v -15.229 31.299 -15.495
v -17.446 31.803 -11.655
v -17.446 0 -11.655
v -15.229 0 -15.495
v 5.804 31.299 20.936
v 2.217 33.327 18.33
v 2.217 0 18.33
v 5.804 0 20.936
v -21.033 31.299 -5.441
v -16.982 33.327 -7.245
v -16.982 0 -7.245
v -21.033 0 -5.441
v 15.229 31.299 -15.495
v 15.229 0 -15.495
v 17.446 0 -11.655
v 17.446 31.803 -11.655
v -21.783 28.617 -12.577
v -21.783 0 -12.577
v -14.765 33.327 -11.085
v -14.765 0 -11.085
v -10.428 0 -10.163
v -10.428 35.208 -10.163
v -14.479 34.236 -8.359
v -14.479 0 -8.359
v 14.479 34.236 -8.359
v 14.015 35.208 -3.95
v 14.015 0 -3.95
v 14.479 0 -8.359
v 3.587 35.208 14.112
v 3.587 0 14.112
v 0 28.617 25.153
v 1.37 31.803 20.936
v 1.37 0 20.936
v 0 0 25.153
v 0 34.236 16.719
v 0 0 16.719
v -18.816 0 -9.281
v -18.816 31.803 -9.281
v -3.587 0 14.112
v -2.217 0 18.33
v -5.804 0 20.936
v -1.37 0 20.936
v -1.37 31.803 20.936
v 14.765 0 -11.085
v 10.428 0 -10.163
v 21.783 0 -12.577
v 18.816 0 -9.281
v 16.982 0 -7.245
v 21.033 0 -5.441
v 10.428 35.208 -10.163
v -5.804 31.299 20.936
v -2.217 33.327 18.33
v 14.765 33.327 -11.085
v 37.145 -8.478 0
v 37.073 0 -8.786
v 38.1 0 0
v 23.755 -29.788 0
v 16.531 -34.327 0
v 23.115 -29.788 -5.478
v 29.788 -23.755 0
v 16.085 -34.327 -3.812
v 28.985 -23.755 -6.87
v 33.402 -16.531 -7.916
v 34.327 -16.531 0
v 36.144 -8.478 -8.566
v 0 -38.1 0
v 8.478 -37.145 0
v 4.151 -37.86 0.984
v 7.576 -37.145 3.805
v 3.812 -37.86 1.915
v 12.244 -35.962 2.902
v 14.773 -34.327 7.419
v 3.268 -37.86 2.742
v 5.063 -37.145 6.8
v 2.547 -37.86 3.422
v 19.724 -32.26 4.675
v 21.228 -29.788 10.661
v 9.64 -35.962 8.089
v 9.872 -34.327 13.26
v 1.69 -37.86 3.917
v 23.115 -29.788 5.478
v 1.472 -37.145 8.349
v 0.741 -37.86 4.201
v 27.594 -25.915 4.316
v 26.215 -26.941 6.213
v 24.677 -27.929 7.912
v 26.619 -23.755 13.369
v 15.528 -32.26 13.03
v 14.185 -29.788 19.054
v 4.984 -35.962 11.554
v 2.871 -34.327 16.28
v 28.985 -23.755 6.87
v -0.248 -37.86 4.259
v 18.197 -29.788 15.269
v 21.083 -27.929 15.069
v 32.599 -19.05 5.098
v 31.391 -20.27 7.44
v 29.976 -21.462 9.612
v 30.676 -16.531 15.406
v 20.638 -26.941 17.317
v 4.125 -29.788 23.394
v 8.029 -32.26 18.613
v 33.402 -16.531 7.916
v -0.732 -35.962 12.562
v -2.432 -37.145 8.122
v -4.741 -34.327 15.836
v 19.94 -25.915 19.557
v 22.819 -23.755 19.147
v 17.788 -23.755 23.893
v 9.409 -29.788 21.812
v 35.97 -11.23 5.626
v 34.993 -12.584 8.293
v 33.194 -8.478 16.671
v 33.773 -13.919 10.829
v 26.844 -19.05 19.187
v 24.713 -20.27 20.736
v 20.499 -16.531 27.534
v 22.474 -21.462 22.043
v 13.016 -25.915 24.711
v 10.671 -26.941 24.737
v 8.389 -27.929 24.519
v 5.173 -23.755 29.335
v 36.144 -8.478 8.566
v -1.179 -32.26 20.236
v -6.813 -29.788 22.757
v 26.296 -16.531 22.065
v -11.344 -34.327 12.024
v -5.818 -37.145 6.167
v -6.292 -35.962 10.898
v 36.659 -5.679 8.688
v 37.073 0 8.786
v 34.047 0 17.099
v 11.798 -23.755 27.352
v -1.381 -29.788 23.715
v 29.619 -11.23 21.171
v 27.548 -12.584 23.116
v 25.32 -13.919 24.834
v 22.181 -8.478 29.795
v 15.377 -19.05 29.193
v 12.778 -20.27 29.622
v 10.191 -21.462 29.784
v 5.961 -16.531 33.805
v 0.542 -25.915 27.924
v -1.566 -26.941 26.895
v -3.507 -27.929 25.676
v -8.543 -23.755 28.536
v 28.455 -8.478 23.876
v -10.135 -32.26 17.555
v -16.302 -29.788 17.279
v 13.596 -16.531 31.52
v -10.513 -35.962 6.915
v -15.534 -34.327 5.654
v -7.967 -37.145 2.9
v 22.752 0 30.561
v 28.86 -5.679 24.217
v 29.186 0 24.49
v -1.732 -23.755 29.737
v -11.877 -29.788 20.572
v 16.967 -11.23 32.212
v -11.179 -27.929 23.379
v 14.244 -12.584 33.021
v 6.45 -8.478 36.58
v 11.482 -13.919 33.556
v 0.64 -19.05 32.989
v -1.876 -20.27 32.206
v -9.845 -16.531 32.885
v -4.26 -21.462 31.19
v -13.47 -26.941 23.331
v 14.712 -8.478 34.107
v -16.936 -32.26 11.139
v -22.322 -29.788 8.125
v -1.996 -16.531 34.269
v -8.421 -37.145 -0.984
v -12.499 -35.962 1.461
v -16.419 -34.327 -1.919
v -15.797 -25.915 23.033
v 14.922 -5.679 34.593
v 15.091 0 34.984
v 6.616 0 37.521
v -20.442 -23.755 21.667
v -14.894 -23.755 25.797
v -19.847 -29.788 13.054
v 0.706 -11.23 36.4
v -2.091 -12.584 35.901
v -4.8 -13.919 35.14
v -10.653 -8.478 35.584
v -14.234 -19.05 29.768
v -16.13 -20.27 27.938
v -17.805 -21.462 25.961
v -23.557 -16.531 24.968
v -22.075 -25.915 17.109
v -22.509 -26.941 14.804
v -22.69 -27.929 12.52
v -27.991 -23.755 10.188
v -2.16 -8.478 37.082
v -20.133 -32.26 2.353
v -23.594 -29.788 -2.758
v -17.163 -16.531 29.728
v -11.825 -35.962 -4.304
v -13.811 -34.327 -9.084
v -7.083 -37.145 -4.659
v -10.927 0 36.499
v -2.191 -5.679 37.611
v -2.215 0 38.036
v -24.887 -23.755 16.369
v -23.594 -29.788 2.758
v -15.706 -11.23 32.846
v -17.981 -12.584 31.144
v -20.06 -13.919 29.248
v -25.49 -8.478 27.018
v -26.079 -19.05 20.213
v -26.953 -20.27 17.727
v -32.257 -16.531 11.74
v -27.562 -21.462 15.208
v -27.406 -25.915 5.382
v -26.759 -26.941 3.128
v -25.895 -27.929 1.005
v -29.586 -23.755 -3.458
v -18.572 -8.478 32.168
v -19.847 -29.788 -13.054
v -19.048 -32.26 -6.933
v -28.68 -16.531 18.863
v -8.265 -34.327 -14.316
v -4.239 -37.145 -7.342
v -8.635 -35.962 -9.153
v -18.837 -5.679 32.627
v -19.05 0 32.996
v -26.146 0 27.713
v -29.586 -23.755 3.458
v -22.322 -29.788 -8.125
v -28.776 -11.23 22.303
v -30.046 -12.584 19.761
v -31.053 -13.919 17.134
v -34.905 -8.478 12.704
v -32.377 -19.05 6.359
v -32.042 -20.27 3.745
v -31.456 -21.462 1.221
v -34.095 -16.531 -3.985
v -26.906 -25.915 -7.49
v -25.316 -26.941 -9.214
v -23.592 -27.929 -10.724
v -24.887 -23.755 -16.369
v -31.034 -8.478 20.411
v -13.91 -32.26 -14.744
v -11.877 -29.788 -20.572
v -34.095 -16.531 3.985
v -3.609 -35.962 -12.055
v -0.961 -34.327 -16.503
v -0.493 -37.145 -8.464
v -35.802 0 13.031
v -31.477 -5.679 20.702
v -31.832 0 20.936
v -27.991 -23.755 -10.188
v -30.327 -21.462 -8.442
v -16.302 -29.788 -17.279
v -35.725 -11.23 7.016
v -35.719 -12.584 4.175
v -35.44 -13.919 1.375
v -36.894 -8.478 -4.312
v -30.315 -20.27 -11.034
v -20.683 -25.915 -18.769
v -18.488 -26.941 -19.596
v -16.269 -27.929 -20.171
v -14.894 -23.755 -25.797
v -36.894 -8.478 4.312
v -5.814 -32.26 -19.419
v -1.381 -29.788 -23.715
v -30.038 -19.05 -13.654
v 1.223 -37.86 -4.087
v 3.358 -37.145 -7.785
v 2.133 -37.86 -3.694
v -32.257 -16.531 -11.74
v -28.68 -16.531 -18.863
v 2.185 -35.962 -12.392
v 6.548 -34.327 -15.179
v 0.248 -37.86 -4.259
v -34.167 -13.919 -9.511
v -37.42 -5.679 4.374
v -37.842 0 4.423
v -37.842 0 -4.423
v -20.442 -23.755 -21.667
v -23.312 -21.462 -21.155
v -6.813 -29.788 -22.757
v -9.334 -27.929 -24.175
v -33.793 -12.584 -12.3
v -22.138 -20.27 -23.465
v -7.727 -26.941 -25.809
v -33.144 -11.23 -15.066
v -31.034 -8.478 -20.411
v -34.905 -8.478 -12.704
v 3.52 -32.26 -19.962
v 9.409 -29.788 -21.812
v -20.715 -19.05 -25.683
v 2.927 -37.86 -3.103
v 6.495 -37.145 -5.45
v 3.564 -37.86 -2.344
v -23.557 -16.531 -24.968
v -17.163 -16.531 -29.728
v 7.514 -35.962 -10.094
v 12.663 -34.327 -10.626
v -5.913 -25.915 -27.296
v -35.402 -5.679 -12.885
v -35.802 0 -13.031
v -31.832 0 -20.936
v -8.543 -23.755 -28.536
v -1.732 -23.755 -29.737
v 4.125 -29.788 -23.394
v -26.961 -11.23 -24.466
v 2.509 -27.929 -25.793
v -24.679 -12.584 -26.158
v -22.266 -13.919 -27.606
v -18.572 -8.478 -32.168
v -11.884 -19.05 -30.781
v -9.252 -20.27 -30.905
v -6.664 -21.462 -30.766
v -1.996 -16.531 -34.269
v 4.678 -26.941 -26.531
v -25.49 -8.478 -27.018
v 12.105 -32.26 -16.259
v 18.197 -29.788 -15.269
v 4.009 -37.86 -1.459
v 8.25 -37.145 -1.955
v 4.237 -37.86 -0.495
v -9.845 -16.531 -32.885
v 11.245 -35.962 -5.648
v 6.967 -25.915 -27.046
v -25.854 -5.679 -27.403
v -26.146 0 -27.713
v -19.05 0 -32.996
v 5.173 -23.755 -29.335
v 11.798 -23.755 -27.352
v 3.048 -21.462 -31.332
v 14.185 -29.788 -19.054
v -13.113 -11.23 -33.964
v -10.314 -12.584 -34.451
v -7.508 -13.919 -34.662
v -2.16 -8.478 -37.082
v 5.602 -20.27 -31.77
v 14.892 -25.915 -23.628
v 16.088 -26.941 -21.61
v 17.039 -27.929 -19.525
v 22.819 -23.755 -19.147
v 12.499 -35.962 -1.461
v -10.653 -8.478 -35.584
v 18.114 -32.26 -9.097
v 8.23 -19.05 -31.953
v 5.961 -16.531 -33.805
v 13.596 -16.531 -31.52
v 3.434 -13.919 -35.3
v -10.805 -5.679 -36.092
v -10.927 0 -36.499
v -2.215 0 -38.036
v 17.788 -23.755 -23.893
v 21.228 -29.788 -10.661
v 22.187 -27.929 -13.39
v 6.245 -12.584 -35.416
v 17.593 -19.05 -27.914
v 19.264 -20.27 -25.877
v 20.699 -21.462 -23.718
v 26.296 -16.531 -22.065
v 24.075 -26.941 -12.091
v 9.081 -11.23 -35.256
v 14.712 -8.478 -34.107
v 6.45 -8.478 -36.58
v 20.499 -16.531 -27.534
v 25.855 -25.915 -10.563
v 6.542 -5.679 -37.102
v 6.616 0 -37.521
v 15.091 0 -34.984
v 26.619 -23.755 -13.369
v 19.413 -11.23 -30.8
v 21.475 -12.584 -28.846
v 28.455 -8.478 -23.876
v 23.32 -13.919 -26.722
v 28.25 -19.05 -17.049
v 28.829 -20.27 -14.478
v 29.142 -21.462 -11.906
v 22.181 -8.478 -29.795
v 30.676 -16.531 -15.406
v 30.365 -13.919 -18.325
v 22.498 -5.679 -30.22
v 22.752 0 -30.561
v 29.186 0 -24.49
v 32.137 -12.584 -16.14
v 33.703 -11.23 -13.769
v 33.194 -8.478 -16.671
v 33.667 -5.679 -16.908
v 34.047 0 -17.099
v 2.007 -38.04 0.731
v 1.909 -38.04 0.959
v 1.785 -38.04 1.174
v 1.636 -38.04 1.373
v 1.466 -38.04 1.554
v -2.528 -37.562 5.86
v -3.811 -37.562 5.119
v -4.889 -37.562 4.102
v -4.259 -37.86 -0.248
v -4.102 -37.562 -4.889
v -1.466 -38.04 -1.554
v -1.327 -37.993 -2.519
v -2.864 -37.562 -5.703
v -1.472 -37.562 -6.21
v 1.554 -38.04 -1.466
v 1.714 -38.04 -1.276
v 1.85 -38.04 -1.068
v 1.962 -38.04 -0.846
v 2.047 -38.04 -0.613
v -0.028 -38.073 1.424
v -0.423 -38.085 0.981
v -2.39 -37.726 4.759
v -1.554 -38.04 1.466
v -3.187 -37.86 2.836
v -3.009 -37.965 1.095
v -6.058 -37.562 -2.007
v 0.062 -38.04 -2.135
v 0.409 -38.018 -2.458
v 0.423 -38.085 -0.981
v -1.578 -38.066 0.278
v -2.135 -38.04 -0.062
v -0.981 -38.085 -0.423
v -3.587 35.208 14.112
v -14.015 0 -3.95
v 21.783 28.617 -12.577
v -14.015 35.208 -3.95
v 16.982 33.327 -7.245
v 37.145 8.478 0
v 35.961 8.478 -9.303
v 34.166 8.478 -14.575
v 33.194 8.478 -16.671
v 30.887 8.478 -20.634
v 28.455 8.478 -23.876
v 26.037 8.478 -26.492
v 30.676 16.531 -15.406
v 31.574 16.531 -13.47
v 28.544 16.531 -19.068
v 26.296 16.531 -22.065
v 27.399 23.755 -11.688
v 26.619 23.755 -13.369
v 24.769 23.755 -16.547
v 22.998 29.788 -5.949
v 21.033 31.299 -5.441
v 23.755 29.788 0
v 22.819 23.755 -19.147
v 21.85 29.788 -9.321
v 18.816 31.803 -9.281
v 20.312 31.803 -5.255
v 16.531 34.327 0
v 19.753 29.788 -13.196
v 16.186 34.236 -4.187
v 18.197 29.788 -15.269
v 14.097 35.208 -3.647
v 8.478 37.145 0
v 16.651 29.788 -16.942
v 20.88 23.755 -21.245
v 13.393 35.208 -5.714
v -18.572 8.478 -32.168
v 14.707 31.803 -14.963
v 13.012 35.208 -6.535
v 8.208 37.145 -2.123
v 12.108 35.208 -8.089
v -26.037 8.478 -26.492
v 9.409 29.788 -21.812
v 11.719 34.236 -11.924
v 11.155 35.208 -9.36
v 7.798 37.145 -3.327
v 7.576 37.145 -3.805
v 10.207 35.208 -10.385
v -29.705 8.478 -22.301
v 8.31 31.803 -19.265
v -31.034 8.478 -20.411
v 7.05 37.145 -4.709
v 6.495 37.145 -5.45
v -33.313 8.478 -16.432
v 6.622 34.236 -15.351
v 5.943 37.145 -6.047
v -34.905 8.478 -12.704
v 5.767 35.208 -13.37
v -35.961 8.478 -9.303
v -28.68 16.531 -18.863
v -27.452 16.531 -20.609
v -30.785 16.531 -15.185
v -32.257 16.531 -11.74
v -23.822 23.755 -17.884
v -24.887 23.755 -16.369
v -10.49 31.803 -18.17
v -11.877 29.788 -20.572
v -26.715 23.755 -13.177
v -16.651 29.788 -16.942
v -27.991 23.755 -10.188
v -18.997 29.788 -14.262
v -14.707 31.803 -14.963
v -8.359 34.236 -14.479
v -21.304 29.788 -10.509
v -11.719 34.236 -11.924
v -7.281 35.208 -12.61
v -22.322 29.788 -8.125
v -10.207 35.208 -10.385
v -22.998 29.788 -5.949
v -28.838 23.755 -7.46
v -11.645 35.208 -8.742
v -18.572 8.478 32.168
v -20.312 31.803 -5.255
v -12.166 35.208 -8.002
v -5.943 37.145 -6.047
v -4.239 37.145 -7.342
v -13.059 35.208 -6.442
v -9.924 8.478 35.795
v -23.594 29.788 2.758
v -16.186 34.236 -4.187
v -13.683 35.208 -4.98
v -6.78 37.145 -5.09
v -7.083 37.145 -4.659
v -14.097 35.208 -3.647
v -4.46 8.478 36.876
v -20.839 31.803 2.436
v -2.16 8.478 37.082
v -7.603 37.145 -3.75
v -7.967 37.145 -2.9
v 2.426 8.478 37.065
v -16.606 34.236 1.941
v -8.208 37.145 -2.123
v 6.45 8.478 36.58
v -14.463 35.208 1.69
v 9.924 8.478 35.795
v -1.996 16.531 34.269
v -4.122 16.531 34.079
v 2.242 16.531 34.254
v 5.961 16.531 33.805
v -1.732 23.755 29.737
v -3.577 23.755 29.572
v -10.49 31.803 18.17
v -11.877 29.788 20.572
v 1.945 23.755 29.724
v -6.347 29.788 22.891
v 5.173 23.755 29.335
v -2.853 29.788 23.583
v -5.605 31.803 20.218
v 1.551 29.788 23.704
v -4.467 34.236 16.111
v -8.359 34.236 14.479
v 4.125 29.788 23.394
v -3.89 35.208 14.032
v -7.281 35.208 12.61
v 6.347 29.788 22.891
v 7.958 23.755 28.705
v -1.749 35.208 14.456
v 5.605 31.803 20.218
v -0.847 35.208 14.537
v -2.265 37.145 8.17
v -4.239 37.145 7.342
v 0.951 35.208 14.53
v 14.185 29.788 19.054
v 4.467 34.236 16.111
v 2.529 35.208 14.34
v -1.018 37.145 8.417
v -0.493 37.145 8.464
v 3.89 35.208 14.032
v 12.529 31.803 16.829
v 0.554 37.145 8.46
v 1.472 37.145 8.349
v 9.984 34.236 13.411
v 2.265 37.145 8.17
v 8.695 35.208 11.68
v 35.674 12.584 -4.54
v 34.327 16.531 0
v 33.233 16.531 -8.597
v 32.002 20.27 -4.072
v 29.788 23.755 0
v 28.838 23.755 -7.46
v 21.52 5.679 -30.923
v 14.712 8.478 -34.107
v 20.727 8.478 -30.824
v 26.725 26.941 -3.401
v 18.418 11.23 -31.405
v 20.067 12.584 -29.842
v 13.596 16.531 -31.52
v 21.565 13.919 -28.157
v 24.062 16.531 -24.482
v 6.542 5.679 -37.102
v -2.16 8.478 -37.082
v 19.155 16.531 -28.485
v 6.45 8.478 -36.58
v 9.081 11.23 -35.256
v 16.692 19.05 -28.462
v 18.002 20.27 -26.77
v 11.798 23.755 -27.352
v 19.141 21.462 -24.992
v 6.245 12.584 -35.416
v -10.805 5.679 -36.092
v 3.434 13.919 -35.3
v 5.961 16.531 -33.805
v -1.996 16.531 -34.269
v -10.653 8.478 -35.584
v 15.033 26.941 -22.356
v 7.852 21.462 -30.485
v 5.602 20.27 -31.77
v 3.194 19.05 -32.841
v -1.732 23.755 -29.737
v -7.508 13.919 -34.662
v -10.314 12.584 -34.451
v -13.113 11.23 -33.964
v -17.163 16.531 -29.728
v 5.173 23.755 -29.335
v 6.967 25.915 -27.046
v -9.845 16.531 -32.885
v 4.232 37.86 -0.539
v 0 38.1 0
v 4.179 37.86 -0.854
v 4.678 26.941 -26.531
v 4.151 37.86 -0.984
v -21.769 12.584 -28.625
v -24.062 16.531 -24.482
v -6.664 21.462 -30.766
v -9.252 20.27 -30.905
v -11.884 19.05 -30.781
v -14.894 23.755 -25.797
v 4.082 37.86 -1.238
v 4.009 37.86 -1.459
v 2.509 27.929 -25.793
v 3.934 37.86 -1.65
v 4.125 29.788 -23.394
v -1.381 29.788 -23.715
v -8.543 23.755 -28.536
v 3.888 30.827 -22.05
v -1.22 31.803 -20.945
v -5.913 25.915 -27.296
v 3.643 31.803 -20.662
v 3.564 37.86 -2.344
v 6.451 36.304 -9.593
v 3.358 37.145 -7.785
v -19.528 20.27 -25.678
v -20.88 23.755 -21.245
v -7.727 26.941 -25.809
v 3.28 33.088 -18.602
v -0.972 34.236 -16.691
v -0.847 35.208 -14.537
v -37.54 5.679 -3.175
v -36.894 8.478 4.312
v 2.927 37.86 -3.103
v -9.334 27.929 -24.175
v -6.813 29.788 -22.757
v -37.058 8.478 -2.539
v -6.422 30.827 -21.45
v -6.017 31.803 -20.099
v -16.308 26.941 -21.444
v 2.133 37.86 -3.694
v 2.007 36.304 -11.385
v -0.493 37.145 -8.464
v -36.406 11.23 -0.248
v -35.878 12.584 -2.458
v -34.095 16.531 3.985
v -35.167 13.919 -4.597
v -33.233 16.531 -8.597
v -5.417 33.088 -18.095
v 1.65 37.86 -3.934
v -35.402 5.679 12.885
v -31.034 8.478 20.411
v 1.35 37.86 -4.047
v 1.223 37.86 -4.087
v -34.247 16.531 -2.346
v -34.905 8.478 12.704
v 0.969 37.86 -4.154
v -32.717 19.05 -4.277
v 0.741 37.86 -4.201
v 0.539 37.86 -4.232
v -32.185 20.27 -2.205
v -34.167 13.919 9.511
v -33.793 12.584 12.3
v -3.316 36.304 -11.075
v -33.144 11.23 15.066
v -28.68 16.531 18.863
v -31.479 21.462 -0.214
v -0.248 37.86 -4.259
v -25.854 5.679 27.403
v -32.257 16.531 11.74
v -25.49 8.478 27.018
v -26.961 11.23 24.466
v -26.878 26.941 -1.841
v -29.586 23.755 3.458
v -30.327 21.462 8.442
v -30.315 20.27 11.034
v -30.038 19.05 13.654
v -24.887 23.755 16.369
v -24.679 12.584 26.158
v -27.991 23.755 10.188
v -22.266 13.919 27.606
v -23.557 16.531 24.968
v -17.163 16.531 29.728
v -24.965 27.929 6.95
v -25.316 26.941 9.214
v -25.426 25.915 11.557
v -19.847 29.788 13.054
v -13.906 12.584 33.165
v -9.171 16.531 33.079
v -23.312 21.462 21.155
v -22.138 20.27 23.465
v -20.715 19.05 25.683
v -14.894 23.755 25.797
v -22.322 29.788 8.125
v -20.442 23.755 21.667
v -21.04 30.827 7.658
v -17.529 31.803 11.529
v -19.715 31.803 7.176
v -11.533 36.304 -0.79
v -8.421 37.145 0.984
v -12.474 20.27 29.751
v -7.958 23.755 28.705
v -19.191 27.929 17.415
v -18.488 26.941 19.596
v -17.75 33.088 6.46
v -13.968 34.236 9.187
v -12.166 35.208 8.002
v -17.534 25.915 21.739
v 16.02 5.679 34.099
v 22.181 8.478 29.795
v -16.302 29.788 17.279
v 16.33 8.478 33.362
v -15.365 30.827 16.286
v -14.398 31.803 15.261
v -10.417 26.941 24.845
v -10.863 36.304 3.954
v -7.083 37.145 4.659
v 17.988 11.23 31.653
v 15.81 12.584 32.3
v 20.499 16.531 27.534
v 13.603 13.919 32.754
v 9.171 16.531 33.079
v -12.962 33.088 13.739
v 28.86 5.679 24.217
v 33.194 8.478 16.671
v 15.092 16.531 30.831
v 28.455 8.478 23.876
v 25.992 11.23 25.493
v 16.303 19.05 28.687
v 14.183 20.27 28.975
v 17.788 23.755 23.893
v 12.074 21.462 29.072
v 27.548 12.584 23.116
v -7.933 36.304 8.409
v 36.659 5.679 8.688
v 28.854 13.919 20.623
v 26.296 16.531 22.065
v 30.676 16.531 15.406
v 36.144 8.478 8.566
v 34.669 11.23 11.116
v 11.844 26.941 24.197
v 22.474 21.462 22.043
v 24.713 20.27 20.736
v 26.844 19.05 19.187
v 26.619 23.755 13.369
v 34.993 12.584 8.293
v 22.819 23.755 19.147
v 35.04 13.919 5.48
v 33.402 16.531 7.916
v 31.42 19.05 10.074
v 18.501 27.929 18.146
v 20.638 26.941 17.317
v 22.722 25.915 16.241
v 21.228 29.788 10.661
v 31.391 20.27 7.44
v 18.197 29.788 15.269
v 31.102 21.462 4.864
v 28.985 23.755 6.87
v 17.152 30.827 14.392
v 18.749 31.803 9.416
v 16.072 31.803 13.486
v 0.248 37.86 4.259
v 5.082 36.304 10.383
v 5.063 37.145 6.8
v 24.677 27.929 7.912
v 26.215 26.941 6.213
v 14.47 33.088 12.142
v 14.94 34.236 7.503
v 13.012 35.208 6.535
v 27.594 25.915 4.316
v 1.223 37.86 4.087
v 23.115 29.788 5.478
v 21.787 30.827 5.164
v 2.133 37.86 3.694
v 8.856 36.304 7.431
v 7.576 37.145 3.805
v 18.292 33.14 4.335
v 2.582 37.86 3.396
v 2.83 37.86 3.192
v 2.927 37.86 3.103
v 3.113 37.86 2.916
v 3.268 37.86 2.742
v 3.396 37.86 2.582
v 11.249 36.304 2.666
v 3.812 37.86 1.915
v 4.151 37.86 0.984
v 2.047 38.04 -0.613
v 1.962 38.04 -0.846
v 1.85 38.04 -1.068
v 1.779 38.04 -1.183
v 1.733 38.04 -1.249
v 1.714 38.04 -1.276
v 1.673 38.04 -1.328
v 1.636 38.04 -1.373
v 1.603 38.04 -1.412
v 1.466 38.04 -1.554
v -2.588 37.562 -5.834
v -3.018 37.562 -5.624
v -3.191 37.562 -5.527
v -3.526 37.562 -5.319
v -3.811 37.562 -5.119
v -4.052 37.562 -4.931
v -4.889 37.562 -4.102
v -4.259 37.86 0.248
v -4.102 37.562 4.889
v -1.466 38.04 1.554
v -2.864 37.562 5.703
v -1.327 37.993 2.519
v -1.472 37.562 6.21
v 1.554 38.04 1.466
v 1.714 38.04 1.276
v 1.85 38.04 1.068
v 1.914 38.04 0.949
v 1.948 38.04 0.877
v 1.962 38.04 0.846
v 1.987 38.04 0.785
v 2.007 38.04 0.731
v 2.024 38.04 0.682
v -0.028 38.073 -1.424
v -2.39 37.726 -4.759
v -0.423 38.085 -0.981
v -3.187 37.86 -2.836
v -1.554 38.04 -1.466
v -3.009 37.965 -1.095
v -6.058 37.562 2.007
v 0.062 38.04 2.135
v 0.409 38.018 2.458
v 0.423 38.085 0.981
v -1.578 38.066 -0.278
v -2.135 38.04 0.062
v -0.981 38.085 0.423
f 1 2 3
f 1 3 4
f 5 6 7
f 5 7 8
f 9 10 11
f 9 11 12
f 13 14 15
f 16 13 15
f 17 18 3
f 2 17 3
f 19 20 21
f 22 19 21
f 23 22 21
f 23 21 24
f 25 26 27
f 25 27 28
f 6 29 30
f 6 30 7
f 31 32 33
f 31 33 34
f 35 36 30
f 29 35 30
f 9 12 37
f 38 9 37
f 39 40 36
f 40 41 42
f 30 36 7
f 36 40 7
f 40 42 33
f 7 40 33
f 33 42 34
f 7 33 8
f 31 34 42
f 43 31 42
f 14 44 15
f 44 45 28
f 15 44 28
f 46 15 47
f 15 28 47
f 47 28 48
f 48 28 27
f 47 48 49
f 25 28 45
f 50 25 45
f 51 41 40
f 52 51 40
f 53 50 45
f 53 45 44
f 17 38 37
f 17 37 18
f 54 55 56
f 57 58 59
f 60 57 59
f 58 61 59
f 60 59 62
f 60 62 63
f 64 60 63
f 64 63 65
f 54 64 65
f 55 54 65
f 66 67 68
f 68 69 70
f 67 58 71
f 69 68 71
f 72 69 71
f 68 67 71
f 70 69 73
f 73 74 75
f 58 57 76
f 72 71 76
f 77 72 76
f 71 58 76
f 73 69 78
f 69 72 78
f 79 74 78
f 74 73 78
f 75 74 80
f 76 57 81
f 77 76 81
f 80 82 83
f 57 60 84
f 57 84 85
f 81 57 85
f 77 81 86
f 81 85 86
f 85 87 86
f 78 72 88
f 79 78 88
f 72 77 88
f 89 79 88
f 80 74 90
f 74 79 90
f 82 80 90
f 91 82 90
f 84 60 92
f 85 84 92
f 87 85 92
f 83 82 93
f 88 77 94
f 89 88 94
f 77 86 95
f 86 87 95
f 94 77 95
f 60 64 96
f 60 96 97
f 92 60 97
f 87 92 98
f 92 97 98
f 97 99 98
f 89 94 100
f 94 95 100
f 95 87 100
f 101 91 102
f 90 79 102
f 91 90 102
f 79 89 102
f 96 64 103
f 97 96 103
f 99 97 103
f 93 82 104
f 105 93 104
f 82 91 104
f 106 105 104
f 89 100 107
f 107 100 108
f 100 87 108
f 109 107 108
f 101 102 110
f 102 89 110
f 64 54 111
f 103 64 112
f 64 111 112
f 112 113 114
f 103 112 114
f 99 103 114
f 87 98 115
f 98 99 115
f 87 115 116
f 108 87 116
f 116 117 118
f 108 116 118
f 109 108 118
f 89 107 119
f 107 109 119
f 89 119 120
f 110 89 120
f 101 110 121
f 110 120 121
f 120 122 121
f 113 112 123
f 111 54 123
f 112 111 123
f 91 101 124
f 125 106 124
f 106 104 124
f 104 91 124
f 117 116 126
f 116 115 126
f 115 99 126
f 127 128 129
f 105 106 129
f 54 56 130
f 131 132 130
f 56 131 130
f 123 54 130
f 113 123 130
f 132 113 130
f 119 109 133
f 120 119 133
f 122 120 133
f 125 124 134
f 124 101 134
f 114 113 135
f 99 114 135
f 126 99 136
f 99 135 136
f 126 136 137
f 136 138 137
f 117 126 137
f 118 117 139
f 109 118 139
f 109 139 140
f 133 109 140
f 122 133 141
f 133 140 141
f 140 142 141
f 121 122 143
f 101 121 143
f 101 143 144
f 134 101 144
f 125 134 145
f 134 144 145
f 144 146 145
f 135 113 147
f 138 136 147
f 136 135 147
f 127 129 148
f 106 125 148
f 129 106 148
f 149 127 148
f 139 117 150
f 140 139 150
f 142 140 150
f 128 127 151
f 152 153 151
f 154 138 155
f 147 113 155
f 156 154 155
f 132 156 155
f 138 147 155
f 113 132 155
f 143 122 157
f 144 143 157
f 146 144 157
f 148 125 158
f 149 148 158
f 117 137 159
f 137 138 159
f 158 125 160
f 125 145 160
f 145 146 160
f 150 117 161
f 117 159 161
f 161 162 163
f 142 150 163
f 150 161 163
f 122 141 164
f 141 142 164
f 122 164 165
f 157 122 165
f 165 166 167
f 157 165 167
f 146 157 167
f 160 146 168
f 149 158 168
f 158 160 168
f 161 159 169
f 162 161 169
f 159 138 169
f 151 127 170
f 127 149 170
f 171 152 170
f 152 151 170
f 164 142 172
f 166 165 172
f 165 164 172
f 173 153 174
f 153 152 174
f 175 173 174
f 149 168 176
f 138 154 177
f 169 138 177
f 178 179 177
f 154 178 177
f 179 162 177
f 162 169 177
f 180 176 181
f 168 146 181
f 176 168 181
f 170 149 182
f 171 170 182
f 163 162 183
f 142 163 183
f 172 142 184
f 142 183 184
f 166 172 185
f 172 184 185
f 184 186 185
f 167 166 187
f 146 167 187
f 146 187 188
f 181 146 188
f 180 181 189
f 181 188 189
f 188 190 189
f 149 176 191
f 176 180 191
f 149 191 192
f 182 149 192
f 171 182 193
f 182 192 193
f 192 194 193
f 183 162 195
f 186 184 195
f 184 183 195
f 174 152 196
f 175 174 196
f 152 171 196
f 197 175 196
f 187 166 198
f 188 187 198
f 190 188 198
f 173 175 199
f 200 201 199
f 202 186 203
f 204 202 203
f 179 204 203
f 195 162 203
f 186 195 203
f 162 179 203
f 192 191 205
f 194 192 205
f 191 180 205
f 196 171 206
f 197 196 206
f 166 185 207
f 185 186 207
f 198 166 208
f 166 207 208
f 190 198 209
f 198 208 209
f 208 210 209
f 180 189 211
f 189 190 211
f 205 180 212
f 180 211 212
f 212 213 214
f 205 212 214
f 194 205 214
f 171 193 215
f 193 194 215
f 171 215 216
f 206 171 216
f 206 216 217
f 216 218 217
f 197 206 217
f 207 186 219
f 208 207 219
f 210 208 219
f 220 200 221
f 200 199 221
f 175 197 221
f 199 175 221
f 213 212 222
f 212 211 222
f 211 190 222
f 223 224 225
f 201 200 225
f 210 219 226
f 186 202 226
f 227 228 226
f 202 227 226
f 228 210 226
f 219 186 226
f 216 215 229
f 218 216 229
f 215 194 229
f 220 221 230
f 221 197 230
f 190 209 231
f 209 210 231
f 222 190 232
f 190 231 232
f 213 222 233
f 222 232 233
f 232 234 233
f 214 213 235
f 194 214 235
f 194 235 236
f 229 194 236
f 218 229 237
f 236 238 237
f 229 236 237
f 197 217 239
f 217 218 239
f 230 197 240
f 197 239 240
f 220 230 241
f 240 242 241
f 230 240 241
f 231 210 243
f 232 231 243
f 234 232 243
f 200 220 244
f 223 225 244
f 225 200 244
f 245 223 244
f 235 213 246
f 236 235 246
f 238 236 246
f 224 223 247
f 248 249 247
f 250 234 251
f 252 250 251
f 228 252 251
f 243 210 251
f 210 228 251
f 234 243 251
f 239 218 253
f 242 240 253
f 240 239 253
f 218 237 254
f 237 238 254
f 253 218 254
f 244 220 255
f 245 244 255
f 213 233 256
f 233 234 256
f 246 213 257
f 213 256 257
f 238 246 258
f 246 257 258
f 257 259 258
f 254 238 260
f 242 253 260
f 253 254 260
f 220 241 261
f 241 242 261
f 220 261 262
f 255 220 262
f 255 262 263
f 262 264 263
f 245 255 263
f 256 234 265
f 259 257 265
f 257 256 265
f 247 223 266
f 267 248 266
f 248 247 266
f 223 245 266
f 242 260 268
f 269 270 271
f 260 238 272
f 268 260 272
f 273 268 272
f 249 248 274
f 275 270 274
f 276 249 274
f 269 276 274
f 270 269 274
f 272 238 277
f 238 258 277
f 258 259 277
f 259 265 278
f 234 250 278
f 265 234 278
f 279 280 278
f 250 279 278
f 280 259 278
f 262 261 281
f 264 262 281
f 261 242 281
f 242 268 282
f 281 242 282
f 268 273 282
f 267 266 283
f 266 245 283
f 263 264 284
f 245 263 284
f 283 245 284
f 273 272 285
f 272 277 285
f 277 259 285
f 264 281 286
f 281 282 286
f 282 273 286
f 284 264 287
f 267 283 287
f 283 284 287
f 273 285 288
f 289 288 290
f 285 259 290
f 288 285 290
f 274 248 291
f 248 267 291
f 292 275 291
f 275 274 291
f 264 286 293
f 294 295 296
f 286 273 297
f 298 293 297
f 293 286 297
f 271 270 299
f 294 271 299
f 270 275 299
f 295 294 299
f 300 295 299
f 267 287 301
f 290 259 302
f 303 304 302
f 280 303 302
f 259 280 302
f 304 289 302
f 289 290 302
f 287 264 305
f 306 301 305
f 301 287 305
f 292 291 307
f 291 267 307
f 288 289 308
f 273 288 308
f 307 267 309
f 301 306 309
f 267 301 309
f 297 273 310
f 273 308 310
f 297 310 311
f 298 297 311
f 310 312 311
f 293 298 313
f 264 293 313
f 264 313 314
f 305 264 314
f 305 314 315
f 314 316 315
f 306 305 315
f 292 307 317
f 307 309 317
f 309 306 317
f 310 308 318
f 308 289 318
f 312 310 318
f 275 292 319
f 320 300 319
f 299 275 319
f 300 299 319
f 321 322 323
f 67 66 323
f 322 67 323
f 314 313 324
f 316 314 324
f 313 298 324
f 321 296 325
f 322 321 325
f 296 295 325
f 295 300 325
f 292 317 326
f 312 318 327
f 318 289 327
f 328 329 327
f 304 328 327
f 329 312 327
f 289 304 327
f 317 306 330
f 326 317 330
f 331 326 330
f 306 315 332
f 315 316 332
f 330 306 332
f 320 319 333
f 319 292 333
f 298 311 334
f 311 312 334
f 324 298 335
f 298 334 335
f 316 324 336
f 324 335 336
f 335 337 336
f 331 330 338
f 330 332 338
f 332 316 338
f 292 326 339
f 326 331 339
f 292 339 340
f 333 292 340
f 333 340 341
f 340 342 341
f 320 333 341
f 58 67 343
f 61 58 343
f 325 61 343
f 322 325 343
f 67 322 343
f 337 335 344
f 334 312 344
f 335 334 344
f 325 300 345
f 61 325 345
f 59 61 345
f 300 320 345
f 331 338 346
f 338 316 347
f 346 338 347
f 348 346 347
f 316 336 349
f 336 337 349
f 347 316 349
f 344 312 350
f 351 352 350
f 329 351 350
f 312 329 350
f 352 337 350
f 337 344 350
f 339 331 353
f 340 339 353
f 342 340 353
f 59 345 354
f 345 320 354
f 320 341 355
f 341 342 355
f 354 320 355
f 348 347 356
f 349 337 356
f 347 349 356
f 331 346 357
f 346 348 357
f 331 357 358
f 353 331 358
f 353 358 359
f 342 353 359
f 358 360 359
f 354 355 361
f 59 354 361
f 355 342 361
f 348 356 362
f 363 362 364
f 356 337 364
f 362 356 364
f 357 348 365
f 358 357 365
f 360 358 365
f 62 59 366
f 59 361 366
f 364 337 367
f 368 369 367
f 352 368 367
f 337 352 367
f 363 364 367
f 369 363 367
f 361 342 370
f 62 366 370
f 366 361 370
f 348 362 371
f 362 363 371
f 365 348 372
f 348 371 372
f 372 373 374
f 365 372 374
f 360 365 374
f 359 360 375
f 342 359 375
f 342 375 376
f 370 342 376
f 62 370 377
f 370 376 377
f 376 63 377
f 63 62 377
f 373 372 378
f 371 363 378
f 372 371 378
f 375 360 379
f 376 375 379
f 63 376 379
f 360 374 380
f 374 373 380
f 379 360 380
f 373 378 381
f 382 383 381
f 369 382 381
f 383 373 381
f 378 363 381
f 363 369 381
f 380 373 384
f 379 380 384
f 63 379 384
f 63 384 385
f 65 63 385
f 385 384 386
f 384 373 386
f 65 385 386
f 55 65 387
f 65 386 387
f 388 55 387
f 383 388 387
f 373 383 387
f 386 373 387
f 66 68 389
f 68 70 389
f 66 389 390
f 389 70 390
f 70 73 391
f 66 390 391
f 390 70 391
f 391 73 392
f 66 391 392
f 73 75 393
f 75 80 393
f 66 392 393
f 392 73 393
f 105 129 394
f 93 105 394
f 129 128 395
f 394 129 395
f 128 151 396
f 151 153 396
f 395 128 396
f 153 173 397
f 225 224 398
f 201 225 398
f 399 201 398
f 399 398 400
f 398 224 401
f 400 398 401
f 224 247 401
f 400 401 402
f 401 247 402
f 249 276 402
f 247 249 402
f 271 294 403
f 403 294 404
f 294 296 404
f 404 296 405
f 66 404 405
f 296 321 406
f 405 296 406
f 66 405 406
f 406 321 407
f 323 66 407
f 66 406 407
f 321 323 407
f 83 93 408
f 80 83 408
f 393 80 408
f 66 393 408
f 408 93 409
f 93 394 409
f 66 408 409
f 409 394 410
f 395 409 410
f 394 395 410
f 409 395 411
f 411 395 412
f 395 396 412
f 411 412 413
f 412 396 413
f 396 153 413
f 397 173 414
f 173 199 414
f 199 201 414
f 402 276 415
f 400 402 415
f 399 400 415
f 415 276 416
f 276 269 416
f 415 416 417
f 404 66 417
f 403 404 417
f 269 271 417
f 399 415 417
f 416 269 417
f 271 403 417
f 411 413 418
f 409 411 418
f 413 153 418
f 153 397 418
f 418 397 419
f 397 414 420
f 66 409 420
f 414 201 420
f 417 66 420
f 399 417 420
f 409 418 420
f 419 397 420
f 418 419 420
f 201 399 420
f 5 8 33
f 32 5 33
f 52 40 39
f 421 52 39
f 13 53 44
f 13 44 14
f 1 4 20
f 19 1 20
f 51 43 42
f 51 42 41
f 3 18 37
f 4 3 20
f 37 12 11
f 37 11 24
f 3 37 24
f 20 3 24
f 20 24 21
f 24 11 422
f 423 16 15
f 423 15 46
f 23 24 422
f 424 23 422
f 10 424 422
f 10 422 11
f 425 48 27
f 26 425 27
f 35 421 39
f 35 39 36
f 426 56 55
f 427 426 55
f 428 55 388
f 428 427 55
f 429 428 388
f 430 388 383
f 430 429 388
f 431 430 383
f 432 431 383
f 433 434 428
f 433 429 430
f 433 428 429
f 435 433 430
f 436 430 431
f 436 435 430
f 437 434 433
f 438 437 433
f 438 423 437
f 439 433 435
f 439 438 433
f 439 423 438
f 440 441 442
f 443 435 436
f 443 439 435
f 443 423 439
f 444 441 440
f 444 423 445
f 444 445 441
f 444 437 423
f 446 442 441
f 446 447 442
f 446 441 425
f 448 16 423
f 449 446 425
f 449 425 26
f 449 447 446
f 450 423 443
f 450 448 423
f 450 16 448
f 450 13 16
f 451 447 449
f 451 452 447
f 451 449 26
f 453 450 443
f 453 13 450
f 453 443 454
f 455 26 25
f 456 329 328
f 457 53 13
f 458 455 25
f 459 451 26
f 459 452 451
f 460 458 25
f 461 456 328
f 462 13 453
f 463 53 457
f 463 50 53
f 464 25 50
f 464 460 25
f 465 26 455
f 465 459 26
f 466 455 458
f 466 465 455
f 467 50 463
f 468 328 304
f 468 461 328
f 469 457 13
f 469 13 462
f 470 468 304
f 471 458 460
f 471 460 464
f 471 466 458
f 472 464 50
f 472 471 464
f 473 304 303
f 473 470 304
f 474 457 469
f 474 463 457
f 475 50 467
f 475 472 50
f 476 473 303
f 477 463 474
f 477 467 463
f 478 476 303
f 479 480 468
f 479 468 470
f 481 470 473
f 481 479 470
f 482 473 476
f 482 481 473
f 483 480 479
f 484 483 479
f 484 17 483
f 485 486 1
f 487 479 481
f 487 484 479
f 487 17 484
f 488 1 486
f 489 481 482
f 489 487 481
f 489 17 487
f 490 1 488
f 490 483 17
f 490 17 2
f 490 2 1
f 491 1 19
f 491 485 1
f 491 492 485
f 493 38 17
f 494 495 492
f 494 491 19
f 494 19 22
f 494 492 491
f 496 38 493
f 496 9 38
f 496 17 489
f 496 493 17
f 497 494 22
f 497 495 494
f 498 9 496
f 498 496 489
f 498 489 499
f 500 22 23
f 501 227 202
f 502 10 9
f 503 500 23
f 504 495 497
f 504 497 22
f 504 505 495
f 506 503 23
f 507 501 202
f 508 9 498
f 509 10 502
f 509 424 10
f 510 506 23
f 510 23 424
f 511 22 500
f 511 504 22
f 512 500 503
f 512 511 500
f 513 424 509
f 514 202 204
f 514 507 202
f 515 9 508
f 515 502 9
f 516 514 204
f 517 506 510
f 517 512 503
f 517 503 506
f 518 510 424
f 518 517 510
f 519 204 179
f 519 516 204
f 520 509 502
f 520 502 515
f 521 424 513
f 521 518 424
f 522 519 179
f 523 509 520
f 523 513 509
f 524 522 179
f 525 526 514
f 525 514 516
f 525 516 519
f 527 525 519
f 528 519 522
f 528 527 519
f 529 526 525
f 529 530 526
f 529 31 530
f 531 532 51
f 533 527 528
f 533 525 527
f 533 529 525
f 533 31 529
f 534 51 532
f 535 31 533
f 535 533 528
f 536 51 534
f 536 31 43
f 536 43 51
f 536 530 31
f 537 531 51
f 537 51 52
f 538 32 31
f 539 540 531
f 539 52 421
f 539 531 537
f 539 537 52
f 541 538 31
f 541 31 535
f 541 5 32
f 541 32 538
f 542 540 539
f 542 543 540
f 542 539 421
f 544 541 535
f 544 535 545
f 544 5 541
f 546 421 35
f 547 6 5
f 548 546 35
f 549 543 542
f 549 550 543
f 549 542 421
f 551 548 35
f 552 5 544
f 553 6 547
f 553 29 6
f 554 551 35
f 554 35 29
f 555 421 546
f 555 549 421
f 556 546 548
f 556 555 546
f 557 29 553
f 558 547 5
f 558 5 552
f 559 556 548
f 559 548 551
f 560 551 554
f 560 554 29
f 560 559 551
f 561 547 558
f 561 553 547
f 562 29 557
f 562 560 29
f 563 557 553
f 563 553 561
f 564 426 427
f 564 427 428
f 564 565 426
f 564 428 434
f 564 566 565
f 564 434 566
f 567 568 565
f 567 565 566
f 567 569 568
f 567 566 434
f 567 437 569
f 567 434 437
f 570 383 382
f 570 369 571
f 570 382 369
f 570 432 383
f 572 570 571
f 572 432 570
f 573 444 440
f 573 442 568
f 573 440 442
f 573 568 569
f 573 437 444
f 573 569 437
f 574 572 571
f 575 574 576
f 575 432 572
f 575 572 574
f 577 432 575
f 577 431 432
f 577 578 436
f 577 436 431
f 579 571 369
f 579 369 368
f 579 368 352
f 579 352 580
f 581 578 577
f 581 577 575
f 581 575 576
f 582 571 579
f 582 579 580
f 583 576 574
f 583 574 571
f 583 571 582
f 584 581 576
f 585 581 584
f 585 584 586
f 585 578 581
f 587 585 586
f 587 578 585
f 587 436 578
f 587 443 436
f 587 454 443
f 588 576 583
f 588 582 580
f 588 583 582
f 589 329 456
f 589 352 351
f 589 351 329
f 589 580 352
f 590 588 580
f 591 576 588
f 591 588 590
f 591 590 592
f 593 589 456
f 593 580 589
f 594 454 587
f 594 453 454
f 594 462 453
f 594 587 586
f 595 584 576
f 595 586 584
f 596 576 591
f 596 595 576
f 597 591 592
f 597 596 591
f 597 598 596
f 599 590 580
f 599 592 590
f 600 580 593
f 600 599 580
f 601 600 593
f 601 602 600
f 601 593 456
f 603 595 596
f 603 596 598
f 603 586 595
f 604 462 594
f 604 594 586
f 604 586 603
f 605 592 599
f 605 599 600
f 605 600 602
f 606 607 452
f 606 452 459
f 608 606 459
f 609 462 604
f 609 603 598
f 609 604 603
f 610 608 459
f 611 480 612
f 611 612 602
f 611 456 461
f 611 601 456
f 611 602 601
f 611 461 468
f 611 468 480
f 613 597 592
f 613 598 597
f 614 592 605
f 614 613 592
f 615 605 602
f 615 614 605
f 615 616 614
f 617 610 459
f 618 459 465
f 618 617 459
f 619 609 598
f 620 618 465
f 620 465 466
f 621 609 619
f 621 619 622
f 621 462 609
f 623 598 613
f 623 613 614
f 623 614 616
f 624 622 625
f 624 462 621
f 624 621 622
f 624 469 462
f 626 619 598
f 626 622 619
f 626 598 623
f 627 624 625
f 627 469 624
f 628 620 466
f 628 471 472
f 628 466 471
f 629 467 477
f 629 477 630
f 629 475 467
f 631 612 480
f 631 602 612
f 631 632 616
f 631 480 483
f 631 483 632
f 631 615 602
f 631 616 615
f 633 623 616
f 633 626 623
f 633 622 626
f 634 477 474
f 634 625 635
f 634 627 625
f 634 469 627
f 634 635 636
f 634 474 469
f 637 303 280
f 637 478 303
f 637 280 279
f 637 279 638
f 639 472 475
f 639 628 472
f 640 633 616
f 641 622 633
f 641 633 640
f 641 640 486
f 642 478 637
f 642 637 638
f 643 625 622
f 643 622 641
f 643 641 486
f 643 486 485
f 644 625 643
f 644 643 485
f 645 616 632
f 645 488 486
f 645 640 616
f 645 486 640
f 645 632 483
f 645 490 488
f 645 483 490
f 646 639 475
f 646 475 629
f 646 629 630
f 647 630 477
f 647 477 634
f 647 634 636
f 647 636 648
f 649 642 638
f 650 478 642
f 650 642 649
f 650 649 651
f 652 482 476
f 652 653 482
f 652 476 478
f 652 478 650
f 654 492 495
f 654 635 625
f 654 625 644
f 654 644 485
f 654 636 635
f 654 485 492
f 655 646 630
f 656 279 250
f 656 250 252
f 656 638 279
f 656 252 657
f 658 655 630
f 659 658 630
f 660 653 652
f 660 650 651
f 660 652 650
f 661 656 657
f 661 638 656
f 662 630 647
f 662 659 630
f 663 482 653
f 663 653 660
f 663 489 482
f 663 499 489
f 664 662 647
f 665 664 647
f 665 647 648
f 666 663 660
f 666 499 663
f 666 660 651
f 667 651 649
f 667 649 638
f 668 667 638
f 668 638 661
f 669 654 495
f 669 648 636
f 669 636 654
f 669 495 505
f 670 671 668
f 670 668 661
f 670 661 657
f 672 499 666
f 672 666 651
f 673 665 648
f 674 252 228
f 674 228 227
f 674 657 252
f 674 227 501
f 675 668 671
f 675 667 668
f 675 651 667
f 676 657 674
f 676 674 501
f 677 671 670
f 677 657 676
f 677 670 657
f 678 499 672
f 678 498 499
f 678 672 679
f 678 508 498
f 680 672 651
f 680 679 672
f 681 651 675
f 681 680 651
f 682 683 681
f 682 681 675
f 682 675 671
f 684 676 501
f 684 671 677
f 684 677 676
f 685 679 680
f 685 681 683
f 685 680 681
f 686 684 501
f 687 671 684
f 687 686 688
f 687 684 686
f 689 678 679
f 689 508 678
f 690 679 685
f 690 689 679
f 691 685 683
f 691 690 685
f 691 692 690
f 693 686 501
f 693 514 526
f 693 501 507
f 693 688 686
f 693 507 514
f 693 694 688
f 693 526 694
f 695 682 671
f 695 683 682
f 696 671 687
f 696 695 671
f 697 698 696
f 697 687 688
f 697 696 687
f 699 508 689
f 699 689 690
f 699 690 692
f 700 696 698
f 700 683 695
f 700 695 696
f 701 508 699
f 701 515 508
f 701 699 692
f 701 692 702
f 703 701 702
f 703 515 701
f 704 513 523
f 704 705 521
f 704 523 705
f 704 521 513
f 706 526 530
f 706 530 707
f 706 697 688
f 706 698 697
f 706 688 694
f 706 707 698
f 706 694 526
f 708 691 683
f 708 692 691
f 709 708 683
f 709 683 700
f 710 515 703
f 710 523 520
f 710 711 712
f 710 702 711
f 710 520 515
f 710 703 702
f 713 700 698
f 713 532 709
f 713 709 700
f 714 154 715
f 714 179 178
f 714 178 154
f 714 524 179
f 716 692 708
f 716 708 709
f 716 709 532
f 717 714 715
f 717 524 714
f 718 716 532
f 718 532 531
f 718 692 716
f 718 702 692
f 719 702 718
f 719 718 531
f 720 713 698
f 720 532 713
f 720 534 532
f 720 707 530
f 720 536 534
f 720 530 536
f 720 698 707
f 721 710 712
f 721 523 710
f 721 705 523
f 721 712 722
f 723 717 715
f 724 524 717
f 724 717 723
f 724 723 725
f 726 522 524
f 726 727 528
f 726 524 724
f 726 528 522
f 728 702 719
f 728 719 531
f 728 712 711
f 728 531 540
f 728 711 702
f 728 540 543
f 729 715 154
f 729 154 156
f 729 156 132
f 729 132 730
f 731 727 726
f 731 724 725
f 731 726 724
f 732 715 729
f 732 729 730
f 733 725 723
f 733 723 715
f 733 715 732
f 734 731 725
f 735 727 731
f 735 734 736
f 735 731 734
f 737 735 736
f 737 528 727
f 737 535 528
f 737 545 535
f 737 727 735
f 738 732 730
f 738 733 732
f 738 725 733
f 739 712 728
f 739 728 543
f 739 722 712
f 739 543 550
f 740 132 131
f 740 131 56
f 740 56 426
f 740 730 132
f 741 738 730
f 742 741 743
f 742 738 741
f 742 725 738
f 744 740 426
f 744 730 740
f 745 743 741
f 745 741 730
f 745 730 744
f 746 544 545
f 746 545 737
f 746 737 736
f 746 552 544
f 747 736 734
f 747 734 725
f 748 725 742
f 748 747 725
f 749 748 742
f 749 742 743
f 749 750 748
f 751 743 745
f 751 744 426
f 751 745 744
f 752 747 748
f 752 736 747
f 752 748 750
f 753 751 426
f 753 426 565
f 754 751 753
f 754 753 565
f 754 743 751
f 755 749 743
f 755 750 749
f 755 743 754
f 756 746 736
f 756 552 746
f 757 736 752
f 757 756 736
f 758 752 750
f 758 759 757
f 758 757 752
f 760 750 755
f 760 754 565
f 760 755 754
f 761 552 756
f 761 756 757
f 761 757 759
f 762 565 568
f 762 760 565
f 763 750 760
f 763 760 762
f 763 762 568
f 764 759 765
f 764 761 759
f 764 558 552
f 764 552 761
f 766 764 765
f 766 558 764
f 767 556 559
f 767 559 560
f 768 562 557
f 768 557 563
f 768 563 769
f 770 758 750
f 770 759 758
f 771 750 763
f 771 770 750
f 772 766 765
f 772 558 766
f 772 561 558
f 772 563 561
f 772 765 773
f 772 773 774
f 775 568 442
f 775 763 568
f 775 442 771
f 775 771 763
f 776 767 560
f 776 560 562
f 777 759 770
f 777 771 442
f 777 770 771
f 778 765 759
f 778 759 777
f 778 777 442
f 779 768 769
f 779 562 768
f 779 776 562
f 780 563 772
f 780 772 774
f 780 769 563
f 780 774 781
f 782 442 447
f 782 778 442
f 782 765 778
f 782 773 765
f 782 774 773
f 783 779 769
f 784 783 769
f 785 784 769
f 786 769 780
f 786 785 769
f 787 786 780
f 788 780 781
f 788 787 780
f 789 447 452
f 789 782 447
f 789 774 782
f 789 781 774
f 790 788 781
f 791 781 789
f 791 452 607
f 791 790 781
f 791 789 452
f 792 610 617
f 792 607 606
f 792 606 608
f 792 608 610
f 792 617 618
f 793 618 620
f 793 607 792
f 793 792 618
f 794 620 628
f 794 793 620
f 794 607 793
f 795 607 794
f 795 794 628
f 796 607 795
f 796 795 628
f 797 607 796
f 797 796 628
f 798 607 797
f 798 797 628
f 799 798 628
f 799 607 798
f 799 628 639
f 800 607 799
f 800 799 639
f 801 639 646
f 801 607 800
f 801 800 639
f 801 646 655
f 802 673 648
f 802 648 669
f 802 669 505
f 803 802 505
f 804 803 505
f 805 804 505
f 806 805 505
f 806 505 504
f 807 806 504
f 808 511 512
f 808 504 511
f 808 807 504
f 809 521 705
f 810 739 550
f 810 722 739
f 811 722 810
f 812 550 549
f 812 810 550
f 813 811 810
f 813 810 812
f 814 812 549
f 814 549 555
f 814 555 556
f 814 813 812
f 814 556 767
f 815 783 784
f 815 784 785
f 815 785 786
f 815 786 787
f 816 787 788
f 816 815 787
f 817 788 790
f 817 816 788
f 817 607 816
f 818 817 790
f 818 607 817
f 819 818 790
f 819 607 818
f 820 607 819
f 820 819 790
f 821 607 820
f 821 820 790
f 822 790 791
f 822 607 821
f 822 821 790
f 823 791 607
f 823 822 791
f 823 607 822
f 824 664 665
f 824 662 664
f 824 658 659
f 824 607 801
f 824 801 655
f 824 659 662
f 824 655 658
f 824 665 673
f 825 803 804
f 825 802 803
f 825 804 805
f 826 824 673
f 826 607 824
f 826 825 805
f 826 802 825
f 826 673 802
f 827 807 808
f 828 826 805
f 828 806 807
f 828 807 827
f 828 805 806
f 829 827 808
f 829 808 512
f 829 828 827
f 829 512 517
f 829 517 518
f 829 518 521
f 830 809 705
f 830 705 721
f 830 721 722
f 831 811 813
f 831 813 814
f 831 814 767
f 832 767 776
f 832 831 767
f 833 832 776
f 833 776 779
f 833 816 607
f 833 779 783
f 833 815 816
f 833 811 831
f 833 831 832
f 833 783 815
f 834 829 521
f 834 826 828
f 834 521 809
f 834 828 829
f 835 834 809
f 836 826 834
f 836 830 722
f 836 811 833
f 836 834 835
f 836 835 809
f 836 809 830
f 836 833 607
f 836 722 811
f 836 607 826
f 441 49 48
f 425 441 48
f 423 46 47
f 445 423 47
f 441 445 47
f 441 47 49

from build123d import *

# Parameters (mm, degrees)
F3_DEPTH = 50.8


with BuildPart() as f1:
    # F0 (on Top) → F1 (revolve)
    with BuildSketch(Plane.XY):
        with BuildLine():
            Line((0, 38.1), (0, 0))
            Line((0, 0), (38.1, 0))
            ThreePointArc((38.1, 0), (26.940768, 26.940768), (0, 38.1))
        make_face()
    revolve(axis=Axis((0, 19.05, 0), (0, 1, 0)))

    # F2 (on face) → F3 (cut)
    with BuildSketch(Plane.XZ):
        Polygon((0, 25.153092), (0, 16.718826), (3.587308, 14.112495), (2.217078, 18.329628), (5.804386, 20.935959), (1.37023, 20.935959), align=None)
        Polygon((-3.587308, 14.112495), (0, 16.718826), (0, 25.153092), (-1.37023, 20.935959), (-5.804386, 20.935959), (-2.217078, 18.329628), align=None)
        Polygon((-18.816187, -9.281326), (-21.783217, -12.576546), (-17.445958, -11.654633), (-15.22888, -15.494725), (-14.765384, -11.08486), (-10.428125, -10.162947), (-14.478928, -8.359413), (-14.015433, -3.949548), (-16.982462, -7.244768), (-21.033265, -5.441234), align=None)
        Polygon((17.445958, -11.654633), (21.783217, -12.576546), (18.816187, -9.281326), (21.033265, -5.441234), (16.982462, -7.244768), (14.015433, -3.949548), (14.478928, -8.359413), (10.428125, -10.162947), (14.765384, -11.08486), (15.22888, -15.494725), align=None)
    extrude(amount=-F3_DEPTH, mode=Mode.SUBTRACT)

    # F4 (on Top) → F5 (revolve)
    with BuildSketch(Plane.XY):
        with BuildLine():
            Line((38.1, 0), (0, 0))
            Line((0, 0), (0, -38.1))
            ThreePointArc((0, -38.1), (26.940768, -26.940768), (38.1, 0))
        make_face()
    revolve(axis=Axis((0, -19.05, 0), (0, -1, 0)))


solid = f1.part
